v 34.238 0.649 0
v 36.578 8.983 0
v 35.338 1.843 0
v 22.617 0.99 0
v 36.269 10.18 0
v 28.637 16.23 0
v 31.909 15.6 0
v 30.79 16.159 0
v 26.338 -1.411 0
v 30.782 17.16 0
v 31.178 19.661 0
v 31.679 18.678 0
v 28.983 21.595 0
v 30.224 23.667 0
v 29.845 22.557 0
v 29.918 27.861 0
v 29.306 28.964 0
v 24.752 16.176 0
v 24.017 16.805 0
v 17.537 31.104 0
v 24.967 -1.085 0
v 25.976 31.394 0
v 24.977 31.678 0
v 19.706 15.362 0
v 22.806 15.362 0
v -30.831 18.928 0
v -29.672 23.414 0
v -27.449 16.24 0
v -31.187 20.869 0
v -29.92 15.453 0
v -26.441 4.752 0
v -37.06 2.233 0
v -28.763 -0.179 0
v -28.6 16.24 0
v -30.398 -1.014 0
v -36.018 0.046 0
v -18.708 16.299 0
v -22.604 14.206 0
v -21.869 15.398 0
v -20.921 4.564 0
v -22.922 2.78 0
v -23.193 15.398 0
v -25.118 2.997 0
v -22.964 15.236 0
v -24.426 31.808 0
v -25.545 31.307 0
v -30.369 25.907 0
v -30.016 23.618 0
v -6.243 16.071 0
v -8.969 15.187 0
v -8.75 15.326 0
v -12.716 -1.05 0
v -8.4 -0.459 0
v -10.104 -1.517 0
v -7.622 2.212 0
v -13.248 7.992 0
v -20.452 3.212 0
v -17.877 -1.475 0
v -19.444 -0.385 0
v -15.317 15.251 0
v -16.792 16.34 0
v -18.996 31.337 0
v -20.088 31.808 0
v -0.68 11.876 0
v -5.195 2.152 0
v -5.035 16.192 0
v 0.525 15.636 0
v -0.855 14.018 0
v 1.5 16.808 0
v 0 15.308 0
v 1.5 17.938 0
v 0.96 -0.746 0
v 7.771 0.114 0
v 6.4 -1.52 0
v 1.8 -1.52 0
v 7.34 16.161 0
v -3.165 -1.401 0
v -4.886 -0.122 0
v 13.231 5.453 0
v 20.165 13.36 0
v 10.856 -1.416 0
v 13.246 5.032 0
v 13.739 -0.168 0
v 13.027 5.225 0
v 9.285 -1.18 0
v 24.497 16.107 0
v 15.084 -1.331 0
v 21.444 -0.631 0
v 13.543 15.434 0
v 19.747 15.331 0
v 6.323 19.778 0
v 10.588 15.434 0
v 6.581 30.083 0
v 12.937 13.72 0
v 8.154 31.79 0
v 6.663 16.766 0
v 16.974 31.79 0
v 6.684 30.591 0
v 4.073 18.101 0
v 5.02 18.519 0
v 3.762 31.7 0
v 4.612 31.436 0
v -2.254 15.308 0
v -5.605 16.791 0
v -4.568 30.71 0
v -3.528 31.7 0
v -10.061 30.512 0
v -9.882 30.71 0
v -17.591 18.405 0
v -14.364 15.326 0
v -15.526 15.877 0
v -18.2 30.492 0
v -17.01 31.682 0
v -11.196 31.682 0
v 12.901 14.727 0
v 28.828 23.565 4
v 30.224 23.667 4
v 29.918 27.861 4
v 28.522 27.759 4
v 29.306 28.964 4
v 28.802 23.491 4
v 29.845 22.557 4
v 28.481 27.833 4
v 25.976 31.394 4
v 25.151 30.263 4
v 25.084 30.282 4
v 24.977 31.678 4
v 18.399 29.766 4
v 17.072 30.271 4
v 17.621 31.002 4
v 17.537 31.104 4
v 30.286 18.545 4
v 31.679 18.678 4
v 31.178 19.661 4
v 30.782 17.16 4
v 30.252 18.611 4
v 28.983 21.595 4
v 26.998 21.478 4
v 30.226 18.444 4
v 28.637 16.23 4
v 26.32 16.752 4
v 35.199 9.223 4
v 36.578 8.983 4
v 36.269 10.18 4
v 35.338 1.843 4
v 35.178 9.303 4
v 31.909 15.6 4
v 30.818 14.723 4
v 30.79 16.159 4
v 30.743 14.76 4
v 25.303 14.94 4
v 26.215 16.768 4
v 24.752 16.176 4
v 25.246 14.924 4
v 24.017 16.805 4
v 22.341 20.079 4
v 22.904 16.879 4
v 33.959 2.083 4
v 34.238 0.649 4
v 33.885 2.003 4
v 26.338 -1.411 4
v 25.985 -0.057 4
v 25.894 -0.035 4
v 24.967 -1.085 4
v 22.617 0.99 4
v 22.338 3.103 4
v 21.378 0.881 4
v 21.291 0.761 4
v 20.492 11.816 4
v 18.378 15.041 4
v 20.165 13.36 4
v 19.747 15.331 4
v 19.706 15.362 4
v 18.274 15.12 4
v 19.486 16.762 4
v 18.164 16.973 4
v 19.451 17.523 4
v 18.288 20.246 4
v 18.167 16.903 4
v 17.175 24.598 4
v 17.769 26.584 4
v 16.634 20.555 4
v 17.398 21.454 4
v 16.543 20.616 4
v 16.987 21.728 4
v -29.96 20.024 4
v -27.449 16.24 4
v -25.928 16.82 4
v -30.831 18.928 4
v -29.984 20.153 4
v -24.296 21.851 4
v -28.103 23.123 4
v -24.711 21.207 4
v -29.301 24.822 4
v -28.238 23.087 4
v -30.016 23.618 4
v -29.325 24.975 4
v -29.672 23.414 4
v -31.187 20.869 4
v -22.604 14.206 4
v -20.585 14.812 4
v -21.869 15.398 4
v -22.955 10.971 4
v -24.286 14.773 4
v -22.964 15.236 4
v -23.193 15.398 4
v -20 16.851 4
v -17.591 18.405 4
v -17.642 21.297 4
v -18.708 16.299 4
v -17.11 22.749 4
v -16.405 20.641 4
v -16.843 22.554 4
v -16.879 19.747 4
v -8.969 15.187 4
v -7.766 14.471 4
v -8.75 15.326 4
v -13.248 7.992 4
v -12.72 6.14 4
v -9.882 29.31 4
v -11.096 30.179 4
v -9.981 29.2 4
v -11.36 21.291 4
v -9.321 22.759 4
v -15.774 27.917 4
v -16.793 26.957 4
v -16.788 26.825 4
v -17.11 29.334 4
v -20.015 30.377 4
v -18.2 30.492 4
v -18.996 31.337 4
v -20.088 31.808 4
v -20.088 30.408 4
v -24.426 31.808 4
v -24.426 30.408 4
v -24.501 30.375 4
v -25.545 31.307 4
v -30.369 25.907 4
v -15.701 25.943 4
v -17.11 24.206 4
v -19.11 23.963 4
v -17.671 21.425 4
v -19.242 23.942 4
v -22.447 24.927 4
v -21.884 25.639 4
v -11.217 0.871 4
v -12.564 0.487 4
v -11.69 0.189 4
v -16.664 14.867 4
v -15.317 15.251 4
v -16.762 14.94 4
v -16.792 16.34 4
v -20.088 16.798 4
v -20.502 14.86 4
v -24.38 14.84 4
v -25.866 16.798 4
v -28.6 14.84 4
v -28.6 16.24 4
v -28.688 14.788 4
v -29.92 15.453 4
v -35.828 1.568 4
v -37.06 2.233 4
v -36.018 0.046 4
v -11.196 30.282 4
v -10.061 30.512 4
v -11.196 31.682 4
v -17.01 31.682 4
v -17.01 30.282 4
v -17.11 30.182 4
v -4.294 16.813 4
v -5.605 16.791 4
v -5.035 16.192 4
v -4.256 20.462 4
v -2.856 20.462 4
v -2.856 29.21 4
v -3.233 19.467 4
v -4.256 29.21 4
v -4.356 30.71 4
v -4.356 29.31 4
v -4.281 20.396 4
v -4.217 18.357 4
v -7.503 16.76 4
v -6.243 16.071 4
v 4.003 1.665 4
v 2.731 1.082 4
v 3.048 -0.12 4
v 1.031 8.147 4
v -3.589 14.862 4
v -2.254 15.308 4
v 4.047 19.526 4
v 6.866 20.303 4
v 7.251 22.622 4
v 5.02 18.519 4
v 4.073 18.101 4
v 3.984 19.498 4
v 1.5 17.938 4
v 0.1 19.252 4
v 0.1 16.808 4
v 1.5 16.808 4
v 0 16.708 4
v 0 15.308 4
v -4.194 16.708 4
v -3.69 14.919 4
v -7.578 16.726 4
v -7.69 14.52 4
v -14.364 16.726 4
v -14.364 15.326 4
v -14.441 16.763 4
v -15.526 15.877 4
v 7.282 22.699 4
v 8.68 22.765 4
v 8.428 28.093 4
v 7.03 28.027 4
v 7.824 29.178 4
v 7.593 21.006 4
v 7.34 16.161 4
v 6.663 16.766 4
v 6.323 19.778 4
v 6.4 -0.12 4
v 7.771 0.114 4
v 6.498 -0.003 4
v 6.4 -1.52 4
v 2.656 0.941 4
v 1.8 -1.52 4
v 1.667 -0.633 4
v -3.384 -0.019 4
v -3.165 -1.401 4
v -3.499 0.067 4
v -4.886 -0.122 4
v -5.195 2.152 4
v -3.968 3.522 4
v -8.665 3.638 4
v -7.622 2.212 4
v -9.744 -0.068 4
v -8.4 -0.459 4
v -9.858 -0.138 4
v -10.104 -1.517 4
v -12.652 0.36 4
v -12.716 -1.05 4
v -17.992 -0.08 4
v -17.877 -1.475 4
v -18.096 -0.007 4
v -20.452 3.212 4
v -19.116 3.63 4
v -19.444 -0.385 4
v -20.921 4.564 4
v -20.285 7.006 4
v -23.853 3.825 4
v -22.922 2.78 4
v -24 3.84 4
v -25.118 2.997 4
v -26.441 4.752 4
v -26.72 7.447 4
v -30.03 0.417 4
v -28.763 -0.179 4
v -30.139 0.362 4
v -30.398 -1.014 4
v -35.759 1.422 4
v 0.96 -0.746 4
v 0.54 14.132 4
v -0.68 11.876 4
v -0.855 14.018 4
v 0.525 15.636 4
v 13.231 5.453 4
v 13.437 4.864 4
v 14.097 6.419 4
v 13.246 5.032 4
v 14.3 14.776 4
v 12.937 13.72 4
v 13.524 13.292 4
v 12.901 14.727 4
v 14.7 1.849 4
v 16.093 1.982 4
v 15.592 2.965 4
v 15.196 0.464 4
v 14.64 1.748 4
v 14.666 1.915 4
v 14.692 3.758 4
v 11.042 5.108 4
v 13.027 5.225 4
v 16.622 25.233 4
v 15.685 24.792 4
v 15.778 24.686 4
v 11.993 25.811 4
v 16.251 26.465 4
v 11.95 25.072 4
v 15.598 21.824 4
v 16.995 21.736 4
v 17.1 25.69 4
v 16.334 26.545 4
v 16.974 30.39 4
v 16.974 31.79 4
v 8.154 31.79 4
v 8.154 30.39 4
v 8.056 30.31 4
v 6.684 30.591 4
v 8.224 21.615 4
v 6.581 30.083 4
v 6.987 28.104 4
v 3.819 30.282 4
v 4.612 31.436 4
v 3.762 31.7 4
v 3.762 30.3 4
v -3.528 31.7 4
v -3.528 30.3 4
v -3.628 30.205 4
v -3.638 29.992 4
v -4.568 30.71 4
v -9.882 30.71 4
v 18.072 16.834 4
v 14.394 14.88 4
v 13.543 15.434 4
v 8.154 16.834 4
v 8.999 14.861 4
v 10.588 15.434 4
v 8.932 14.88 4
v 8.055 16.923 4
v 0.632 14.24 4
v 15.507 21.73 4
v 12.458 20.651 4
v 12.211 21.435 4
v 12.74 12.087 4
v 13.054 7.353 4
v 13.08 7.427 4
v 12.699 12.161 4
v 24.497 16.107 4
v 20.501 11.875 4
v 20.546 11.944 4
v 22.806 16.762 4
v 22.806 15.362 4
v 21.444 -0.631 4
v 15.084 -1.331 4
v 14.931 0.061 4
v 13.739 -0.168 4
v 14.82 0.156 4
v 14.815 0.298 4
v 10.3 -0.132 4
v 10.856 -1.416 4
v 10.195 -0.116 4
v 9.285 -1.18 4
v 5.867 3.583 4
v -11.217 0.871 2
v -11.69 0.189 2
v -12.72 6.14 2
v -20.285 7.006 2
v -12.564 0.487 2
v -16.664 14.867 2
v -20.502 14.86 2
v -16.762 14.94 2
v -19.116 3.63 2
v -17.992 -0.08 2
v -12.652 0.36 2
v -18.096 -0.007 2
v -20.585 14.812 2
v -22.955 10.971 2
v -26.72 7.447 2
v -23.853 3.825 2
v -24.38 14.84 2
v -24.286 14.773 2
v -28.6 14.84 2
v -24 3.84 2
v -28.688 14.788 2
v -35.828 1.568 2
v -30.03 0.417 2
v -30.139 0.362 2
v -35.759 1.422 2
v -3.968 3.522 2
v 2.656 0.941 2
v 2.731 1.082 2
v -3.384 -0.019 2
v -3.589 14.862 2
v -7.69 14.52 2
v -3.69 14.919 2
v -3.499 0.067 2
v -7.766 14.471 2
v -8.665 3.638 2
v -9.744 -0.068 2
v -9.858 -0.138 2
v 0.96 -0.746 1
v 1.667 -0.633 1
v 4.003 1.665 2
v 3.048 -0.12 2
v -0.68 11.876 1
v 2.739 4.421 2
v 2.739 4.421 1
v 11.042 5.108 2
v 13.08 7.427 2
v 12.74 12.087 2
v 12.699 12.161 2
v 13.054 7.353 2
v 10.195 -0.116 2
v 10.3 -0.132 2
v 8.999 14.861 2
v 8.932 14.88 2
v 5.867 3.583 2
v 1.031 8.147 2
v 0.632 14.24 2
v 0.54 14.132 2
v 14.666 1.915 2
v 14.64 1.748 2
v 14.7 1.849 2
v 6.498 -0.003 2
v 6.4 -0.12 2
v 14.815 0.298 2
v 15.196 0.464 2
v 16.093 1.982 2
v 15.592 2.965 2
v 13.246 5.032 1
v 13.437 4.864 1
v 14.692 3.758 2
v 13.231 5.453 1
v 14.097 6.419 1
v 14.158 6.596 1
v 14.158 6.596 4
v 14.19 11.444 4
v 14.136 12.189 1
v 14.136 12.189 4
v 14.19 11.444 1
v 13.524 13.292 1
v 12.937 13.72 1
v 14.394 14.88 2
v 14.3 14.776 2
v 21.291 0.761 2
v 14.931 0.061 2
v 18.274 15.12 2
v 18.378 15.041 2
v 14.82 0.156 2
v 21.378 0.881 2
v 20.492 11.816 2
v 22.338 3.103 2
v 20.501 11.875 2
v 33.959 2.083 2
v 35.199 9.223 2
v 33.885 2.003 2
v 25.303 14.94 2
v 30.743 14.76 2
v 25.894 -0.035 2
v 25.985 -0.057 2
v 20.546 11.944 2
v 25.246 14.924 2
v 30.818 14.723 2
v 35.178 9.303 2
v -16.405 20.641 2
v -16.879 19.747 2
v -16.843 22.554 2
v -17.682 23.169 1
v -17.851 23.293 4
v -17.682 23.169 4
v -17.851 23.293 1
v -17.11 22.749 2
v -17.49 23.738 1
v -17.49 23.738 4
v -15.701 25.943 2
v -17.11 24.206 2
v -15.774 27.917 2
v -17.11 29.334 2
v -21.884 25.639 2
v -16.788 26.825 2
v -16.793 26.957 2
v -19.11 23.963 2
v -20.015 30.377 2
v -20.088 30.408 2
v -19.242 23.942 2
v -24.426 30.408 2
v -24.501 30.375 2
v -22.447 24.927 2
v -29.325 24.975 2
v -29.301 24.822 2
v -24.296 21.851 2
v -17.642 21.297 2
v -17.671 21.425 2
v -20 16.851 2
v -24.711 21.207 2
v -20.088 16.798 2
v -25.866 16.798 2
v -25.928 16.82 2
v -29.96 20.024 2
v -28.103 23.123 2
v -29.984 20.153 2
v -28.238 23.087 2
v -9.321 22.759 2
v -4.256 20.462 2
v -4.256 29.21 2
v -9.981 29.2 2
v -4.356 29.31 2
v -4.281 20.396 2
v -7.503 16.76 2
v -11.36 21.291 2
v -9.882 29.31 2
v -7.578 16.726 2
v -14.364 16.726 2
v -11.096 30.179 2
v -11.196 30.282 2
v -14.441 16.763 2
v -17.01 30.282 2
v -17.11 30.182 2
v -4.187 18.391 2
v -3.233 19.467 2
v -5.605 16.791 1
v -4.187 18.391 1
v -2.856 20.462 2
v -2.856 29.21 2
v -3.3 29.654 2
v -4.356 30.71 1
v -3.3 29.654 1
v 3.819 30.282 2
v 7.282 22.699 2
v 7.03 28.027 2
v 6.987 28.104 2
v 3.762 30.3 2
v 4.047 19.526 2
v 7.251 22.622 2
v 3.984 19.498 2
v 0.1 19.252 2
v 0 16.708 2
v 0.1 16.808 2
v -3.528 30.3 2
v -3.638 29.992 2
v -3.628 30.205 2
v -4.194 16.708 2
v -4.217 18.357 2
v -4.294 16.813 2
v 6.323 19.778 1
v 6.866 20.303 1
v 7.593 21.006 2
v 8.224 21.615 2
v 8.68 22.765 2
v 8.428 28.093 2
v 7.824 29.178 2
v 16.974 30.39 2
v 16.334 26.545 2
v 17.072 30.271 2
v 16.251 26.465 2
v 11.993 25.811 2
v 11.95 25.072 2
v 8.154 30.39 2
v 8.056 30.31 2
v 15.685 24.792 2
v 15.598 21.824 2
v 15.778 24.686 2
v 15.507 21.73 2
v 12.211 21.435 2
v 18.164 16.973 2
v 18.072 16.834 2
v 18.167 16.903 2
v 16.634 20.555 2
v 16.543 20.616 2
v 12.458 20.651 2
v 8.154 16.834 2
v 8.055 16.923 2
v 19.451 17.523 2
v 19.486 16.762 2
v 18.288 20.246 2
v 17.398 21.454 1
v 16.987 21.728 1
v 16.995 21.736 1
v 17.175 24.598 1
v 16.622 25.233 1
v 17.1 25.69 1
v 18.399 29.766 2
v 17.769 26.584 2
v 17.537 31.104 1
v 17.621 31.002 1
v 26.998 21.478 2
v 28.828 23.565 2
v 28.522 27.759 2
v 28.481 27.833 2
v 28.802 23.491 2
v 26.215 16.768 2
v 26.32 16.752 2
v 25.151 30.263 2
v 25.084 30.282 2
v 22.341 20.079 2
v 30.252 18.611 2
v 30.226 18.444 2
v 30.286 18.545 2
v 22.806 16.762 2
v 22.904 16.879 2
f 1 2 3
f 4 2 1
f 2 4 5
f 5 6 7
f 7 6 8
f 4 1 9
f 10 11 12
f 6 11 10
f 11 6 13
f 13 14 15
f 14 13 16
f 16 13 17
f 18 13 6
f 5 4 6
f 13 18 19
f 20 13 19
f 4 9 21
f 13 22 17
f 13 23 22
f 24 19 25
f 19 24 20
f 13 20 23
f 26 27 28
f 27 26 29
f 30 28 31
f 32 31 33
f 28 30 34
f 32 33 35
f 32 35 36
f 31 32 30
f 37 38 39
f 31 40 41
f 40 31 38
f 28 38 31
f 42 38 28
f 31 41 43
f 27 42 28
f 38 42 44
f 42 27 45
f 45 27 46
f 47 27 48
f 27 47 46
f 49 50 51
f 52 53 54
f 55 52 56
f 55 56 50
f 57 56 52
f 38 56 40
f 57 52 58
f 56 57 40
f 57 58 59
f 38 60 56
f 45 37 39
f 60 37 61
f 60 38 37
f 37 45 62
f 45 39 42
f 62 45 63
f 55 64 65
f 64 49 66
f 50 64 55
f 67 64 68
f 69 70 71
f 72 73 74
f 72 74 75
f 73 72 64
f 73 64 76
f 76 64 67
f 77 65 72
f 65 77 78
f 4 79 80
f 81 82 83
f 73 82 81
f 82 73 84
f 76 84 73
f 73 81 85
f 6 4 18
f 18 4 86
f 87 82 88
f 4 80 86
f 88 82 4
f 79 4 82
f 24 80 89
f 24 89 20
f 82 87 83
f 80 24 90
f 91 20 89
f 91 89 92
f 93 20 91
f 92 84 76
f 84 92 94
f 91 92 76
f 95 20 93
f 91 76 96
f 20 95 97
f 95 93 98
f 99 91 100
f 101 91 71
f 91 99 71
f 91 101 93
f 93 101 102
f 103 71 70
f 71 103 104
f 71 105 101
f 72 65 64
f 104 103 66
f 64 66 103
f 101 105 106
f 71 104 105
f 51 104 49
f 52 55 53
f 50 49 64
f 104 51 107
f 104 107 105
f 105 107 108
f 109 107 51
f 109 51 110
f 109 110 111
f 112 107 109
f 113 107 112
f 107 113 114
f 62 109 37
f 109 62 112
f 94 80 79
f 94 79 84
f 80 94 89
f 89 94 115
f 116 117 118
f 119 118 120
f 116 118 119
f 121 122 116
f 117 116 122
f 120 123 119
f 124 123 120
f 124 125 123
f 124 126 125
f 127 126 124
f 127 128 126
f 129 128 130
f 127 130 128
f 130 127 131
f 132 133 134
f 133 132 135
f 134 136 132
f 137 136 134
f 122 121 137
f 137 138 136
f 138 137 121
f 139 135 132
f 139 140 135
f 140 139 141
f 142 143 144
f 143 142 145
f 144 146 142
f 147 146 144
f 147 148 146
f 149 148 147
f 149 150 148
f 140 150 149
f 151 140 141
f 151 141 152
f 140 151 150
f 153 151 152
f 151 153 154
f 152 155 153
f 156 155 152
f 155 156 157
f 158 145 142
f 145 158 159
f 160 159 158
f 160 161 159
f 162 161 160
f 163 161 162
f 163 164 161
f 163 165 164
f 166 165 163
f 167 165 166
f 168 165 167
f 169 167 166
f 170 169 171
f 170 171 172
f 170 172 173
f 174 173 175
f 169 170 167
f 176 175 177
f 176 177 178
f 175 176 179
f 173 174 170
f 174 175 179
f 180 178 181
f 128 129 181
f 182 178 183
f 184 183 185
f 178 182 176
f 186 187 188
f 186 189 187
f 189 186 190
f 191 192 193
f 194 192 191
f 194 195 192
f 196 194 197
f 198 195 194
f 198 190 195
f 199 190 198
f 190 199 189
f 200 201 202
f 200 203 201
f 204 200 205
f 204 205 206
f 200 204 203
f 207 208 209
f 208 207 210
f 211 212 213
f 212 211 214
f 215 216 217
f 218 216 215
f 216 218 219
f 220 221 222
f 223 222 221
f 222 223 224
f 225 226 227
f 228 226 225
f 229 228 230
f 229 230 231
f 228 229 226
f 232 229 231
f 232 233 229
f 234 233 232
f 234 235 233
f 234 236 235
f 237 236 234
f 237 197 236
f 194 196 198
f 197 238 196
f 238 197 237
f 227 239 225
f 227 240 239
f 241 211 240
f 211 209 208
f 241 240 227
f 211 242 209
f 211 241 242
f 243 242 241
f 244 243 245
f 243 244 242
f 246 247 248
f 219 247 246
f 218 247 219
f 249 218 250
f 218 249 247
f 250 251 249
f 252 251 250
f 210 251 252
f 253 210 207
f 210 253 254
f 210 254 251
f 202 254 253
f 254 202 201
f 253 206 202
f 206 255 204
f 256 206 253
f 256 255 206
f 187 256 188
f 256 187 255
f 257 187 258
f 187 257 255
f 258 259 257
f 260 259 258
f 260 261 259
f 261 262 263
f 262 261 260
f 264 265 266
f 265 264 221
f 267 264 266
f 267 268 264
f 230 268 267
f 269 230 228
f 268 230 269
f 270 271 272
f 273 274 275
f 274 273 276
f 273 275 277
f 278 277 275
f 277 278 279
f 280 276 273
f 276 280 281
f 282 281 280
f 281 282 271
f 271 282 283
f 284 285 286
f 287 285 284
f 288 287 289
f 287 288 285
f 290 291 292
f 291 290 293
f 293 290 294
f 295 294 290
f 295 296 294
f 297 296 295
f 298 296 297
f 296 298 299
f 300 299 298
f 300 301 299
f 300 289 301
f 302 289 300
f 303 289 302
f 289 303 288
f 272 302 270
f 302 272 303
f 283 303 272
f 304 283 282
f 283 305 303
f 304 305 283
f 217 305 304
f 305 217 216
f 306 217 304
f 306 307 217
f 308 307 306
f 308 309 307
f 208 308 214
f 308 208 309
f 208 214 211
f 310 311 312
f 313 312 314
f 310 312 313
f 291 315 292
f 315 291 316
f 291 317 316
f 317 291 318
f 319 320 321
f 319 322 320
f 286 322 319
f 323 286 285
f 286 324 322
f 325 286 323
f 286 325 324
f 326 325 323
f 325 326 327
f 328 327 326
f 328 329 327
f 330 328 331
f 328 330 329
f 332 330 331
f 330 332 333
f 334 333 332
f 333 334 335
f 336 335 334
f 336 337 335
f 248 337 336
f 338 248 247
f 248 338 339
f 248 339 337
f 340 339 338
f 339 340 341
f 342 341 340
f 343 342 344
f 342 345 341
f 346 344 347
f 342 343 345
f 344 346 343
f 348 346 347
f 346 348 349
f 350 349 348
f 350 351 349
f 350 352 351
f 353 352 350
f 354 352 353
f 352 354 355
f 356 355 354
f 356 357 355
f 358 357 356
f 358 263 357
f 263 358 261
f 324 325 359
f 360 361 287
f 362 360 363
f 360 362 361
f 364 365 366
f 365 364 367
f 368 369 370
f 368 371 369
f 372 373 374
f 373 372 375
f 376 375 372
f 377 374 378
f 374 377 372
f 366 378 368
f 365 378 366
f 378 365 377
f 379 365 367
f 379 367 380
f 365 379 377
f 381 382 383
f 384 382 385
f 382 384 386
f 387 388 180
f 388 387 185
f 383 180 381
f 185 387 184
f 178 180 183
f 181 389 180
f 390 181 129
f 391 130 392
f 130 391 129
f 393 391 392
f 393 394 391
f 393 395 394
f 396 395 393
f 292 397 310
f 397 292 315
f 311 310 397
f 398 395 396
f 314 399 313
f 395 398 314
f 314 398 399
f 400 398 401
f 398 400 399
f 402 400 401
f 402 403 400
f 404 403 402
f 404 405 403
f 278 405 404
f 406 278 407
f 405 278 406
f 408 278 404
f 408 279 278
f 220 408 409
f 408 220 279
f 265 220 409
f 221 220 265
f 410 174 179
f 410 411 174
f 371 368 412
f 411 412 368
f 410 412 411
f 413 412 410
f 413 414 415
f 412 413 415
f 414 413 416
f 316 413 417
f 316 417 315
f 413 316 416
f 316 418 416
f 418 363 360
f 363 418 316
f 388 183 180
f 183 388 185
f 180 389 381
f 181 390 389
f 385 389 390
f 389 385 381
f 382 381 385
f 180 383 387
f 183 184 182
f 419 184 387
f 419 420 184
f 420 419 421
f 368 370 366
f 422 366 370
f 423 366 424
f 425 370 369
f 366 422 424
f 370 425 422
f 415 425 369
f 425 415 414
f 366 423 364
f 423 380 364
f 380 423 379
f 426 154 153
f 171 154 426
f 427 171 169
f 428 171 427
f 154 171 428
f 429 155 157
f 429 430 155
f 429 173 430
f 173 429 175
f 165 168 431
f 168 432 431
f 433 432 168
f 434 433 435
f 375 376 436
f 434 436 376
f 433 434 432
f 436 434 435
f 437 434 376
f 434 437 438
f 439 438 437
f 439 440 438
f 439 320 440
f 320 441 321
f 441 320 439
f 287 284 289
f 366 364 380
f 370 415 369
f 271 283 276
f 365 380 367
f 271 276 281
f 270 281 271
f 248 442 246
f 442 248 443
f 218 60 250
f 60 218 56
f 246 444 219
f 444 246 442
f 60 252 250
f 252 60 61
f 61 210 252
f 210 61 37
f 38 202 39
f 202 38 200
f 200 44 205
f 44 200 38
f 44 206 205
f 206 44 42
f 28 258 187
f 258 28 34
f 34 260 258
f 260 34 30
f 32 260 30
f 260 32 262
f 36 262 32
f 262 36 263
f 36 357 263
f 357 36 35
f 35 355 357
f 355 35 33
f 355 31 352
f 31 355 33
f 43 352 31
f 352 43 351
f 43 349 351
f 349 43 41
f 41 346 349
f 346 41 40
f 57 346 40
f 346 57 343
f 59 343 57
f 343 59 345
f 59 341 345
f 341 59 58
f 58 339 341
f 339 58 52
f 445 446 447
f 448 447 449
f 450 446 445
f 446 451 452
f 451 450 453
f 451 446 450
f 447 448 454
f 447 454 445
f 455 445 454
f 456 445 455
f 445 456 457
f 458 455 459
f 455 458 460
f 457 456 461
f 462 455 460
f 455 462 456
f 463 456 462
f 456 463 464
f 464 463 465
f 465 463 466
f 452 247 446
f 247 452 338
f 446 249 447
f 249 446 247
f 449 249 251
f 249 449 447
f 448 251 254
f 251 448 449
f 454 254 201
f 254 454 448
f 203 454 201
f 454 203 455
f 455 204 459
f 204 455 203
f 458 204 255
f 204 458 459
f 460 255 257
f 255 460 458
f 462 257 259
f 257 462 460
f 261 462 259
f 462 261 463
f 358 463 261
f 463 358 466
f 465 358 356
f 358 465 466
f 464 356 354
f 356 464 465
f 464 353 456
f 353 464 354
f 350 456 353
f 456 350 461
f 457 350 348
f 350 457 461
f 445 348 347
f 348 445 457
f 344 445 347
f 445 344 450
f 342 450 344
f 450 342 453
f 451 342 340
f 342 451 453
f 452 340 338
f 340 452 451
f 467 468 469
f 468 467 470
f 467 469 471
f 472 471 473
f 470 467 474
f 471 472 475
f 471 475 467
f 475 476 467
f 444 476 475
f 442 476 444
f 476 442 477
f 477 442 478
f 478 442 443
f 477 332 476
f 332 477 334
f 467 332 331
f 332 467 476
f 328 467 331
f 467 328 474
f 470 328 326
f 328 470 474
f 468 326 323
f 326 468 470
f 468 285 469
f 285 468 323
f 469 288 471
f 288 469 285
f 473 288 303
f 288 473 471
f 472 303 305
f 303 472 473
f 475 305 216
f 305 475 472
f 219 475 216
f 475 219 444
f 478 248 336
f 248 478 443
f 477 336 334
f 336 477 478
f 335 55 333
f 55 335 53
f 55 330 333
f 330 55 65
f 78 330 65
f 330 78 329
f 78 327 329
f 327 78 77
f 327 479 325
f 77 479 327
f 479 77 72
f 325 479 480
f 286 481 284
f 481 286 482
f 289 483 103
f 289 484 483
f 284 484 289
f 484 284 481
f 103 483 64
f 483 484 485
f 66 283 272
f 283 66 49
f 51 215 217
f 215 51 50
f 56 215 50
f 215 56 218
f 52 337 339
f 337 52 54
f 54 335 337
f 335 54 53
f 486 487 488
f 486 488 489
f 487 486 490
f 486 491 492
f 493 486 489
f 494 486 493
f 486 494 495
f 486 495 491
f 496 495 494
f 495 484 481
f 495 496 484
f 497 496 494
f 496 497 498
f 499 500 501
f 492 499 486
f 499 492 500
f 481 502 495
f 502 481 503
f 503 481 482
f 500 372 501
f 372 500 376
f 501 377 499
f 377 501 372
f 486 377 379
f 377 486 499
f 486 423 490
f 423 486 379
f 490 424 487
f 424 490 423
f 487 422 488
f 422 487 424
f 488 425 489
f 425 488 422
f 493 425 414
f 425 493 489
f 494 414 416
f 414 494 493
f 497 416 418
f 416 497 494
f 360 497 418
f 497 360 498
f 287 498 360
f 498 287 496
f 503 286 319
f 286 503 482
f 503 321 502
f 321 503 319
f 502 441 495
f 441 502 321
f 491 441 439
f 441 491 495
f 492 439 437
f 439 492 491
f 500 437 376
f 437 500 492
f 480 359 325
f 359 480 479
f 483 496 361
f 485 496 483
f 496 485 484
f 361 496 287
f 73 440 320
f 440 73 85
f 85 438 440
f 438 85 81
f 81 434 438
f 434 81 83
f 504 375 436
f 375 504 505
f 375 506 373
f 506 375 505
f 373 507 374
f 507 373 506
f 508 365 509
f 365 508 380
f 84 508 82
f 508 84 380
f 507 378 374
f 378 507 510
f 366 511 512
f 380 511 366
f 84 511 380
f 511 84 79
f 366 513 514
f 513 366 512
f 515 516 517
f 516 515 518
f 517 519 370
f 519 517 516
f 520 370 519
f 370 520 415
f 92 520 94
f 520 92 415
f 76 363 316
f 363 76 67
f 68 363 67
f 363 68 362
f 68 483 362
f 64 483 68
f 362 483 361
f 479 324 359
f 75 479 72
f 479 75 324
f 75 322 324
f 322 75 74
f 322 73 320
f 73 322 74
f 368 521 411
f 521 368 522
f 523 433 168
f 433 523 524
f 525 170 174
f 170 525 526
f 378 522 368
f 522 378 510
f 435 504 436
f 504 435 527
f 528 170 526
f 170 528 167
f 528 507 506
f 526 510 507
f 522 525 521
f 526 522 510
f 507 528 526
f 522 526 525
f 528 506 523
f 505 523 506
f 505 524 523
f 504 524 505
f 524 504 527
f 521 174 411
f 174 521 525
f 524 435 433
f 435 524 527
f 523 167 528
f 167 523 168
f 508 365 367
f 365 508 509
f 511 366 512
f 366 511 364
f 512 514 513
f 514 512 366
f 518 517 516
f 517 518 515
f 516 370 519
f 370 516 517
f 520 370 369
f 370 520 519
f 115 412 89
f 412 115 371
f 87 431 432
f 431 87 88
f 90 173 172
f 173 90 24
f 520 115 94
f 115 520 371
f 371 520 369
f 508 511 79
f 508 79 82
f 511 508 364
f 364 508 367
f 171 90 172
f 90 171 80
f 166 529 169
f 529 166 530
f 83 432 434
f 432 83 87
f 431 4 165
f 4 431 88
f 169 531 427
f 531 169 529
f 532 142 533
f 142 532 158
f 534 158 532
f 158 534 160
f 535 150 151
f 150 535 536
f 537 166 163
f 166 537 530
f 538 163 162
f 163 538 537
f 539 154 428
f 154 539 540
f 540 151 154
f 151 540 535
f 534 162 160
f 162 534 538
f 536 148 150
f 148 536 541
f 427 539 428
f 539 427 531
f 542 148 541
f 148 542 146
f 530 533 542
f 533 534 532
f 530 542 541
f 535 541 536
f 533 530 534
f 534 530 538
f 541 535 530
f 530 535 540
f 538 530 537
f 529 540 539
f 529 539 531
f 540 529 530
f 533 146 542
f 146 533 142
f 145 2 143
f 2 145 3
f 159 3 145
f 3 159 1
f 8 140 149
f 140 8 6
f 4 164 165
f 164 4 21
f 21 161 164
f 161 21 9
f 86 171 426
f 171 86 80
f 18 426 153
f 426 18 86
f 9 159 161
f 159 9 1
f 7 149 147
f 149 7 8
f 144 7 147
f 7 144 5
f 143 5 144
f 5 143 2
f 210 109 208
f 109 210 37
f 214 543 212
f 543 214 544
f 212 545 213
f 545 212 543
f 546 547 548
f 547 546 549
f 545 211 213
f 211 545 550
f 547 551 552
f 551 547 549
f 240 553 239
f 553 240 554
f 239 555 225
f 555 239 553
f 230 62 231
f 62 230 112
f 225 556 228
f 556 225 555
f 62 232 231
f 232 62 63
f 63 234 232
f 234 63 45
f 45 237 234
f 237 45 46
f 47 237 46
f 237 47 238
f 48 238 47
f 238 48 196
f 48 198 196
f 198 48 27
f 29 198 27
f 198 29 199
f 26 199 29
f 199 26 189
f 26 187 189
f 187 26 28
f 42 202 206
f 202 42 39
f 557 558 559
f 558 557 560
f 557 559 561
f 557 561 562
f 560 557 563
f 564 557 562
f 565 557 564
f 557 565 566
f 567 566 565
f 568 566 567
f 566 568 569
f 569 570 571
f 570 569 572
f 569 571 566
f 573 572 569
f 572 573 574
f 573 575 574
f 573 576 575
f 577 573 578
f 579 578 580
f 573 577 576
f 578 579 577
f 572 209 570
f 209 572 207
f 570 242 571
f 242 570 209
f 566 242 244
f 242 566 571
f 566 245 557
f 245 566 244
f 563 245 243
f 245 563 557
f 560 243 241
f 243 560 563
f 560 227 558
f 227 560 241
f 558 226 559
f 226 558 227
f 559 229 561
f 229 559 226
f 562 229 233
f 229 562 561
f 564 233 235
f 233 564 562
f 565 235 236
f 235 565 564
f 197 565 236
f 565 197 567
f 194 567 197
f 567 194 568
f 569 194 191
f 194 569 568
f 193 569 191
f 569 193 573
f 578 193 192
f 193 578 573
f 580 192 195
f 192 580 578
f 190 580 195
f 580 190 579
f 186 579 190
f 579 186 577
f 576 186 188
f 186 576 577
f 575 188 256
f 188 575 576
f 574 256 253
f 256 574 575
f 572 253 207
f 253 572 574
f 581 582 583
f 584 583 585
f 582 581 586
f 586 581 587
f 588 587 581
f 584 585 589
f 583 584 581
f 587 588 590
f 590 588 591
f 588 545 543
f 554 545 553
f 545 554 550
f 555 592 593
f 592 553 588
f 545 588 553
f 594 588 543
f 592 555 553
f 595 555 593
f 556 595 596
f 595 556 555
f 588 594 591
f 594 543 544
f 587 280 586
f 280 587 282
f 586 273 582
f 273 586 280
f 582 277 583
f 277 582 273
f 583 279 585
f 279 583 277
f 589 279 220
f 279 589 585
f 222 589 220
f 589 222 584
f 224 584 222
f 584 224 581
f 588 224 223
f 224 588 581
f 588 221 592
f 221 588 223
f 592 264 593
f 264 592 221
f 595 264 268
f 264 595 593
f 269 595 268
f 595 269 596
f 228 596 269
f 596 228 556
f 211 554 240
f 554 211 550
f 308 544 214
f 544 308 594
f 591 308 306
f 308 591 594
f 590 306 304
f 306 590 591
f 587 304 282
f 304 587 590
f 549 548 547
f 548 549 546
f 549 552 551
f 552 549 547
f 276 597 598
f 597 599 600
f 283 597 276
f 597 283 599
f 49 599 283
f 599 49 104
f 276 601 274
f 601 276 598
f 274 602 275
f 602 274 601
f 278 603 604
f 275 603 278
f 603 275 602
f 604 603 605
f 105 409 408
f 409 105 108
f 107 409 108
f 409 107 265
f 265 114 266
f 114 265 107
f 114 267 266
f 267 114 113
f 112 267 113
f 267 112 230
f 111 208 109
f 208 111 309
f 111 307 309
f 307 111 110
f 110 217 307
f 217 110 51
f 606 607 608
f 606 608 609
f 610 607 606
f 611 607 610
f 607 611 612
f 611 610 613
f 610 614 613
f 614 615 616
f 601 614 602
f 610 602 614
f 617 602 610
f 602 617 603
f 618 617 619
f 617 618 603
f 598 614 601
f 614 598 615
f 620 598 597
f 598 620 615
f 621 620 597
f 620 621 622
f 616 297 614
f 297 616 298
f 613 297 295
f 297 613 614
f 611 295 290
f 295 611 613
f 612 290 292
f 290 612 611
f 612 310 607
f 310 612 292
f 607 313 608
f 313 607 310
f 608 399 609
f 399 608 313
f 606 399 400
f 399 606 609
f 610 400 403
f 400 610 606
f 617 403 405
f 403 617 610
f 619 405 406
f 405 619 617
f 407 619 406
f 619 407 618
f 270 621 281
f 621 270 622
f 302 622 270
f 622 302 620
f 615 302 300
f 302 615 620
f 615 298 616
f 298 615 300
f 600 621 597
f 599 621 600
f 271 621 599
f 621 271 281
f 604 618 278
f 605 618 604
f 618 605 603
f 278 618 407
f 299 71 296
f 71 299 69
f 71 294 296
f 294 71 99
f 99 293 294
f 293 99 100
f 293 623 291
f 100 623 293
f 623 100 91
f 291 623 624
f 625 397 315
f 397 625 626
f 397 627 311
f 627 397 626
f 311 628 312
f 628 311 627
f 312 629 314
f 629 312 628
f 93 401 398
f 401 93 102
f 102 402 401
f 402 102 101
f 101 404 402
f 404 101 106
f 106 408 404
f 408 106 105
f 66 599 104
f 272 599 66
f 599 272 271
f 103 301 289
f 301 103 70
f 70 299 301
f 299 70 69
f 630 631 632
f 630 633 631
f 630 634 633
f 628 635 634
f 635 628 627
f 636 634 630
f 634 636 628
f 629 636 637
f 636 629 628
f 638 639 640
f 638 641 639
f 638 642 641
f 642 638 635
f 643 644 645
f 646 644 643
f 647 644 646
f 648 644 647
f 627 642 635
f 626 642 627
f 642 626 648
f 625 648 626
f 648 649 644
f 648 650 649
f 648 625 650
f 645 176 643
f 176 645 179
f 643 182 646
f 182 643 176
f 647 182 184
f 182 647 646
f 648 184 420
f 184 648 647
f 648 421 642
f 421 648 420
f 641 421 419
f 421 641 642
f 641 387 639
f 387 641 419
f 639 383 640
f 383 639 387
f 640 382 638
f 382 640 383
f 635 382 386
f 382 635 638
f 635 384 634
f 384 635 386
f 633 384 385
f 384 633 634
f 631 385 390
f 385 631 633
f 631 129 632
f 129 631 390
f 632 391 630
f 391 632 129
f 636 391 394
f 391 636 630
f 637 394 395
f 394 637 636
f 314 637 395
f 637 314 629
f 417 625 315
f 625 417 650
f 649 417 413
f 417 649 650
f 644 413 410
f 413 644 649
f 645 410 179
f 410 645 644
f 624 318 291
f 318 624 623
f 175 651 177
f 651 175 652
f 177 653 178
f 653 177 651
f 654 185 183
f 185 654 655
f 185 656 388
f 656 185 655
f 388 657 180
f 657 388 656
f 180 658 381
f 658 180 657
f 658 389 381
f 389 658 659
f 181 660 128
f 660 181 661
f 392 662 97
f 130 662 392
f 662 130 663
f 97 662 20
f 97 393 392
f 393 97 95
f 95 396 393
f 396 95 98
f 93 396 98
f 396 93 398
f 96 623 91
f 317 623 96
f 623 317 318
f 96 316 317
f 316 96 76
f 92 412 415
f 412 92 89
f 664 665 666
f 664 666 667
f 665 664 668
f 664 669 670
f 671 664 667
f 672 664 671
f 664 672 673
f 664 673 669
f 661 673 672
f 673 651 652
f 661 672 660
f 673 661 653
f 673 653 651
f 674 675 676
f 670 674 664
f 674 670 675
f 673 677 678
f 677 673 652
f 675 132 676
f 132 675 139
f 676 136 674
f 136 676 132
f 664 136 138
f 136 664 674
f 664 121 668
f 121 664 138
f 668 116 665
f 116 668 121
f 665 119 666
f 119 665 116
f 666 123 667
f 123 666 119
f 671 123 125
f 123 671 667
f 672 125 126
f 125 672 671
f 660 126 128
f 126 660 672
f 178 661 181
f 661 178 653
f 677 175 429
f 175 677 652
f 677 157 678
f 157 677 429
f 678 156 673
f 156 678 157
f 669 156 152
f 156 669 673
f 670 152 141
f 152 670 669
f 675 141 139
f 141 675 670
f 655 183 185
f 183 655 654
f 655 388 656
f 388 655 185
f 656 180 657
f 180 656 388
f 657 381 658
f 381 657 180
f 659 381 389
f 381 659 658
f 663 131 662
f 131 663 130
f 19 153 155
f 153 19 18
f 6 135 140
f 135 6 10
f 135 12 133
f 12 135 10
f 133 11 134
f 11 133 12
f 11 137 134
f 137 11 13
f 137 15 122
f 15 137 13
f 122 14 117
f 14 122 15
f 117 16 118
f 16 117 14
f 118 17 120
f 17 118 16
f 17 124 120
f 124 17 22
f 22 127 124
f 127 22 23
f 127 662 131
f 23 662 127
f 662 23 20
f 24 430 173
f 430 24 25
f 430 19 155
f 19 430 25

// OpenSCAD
// Choose your custom words and write them in UPPERCASE.
// If you want only one line, you can leave the second word empty.
word1 = "SUPER";
word2 = "MARIO";

// The following values are model constants and are not intended to be changed by the end user.
//-----------------
// [Fixed design parameters]

// Scale factor for the first word (word1)
scale_word1 = 1.8;

// Scale factor for the second word (word2)
scale_word2 = 2.0;

// Height of the extruded letters
scale_height = 5.0;

// Height of the brim (the base outline under the letters)
brim_height = 4.0;

// Radius/offset for the brim outline
brim_radius = 1.5;

// Vertical gap between the two words
gap = 2;

// Horizontal spacing between letters
spacing = 0.0;

// Thickness of the base of the brim
bottom_thickness = 2;

// Small tolerance to help letters fit into the brim
wiggle = 0.1;




//-----------------

// Path data for each letter and symbol, used to draw the glyphs
// Each glyph is a list of 2D points (x, y), divided by 100 for scaling
glyph_A = [
    [449, 741], [765, 52], [463, 4], [439, 181], [196, 187], [141, -2], [-150, 50], [249, 721], [449, 741]
]/100;
glyph_B = [
    [138, 747], [485, 706], [565, 578], [559, 441], [507, 363], [580, 321], [629, 178], [573, 45], [457, 4], [21, 1], [1, 704], [138, 747]
]/100;
glyph_C = [
    [287, 744], [563, 726], [552, 461], [372, 545], [215, 472], [208, 302], [346, 208], [549, 314], [617, 35], [218, 0], [23, 171], [-35, 386], [55, 617], [287, 744]
]/100;
glyph_D = [
    [368, 744], [578, 572], [621, 171], [414, 2], [0, 2], [0, 699], [368, 744]
]/100;
glyph_E = [
    [54, 745], [544, 745], [503, 538], [262, 501], [259, 450], [472, 434], 
    [462, 275], [272, 258], [289, 204], [520, 202], [605, 3], [54, 3], 
    [0, 481], [54, 745]
]/100;
glyph_F = [
    [49, 746], [553, 742], [525, 501], [250, 532], [246, 452], [479, 464], [441, 244], [246, 269], [288, 3], [22, 3], [1, 543], [49, 746]
]/100;
glyph_G = [
    [627, 591], [456, 495], [387, 533], [285, 502], [224, 357], [288, 222], [472, 244], [476, 277], [334, 264], [352, 465], [648, 461], [648, 66], [151, 2], [0, 309], [55, 591], [267, 745], [527, 727], [627, 591]
]/100;
glyph_H = [
    [0, 698], [252, 746], [264, 441], [411, 463], [420, 732], [626, 723], [666, 5], [434, 13], [432, 238], [292, 211], [297, 5], [80, 5],
    [0, 698]
]/100;
glyph_I = [
    [5, 739], [199, 751], [349, 43], [31, 8], [5, 739]
]/100;
glyph_J = [
    [0, 739], [219, 744], [658, 724], [658, 528], [459, 509],
    [533, 162], [430, 32], [235, 0], [18, 0], [25, 220],
    [263, 237], [236, 509], [0, 528], [0, 739]
]/100;
glyph_K = [
    [14, 741], [223, 741], [218, 539], [375, 718], [518, 566],
    [337, 369], [605, 178], [440, 0], [216, 243], [257, -2],
    [0, -2], [14, 741]
]/100;
glyph_L = [
    [278, 717], [249, 269], [556, 306], [584, 75], [28, 9],
    [0, 749], [278, 717]
]/100;
glyph_M = [
    [0, 76], [357, 737], [568, 737], [638, 537], [762, 738],
    [949, 742], [1154, 23], [887, 1], [836, 183], [775, 359],
    [591, 195], [450, 382], [281, 23], [0, 76]
]/100;
glyph_N = [
    [0, 13], [133, 742], [284, 742], [425, 510], [437, 742],
    [669, 706], [620, 4], [428, 16], [280, 242], [237, 3],
    [0, 13]
]/100;
glyph_O = [
    [522, 733], [740, 462], [678, 105], [283, 2], [-32, 280],
    [15, 593], [250, 742], [522, 733]
]/100;
glyph_P = [
    [442, 740], [618, 619], [632, 323], [454, 151], [233, 137], [233, -4], [0, -4], [37, 740], [442, 740]
]/100;
glyph_Q =[
    [531, 731], [721, 478], [653, 216], [797, 84], [621, -2], [535, 61], [238, -3], [-21, 243], [26, 593], [260, 740], [531, 731]
]/100;
glyph_R = [
    [415, 739], [600, 604], [617, 371], [513, 255], [698, 92], [481, -2], [254, 192], [288, -1], [58, -1], [0, 707], [415, 739]
]/100;
glyph_S = [
    [725, 556], [596, 397], [445, 494], [407, 446], [677, 248], [546, 1], [225, 1], [1, 179], [98, 342], [291, 233],
    [320, 278], [37, 446], [305, 746], [546, 746], [725, 556]
]/100;
glyph_T = [
    [0, 742], [739, 729], [739, 429], [489, 470], [558, -1], [200, -1], [254, 470], [0, 483], [0, 742]
]/100;
glyph_U = [
    [-9, 739], [314, 739], [299, 234], [424, 324], [387, 685], [694, 685], [694, 199], [515, -3], [138, -3], [-9, 177], [-9, 739]
]/100;
glyph_V = [
    [0, 745], [259, 731], [362, 284], [401, 334], [512, 731], [799, 745], [517, 3], [169, 29], [0, 745]
]/100;
glyph_W = [
    [1028, 675], [709, 6], [523, 6], [454, 207], [352, 5], [182, 0], [0, 723], [238, 744], [283, 562], [337, 385], [502, 550], [627, 362], [778, 729], [1028, 675]
]/100;
glyph_X = [
    [200, 739], [357, 579], [473, 750], [663, 568], [525, 405], [753, 226], [563, 7], [399, 221], [191, 12], [0, 201], [221, 400], [53, 588], [200, 739]
]/100;
glyph_Y = [
    [71, 733], [236, 557], [391, 753], [610, 588], [371, 380], [548, 13], [156, 31], [156, 350], [-93, 588], [71, 733]
]/100;
glyph_Z = [
    [617, 3], [0, 28], [0, 228], [248, 486], [0, 471], [44, 748], [625, 707], [614, 517], [386, 265], [625, 300], [617, 3]
]/100;
glyph_0 = [
    [381, 732], [552, 531], [497, 90], [224, 1], [3, 223], [48, 606], [202, 742], [381, 732], [560, 732]
]/100;
glyph_1 = [
    [527, 727], [468, 205], [679, 232], [713, 1], [0, 1], [20, 218], [258, 205], [258, 476], [133, 397], [0, 578], [269, 741], [527, 741]
]/100;
glyph_2 = [
    [4, 605], [211, 742], [392, 741], [544, 629], [610, 352], [411, 221], [629, 239], [686, 1], [110, 9], [34, 156], [330, 390], [309, 454], [261, 492], [140, 409], [4, 605]
]/100;
glyph_3 = [
    [1, 607], [178, 740], [403, 708], [511, 522], [441, 421], [528, 357], [534, 131], [415, 1], [148, 26], [1, 175], [120, 291], [220, 197], [314, 222], [317, 279], [170, 329], [176, 419], [295, 498], [264, 531], [97, 454], [1, 607]
]/100;
glyph_4 = [
    [531, 409], [689, 402], [689, 223], [548, 214], [575, 31], [318, 4], [314, 214], [8, 214], [4, 400], [208, 747], [487, 728], [531, 409]
]/100;
glyph_5 = [
    [572, 741], [530, 543], [247, 546], [253, 501], [415, 495], [610, 389], [609, 166], [534, 45], [189, 10], [7, 95], [88, 248], [212, 205], [324, 200], [368, 251], [318, 298], [91, 293], [10, 433], [0, 724], [572, 741]
]/100;
glyph_6 = [
    [154, 719], [335, 746], [515, 709], [447, 499], [286, 559], [211, 500], [202, 444], [416, 438], [501, 300], [499, 120], [380, 1], [136, 1], [0, 120], [0, 371], [28, 575], [154, 719]
]/100;
glyph_7 = [
    [0, 740], [641, 726], [524, -3], [234, 66], [393, 501], [51, 473], [0, 740]
]/100;
glyph_8 = [
    [461, 716], [533, 519], [446, 450], [562, 355], [577, 61], [414, -3], [154, -3], [0, 87], [17, 351], [139, 444], [46, 519], [116, 745], [461, 716]
]/100;
glyph_9 = [
    [306, 747], [533, 593], [524, 320], [447, 127], [116, 1], [0, 161], [264, 230], [319, 327], [137, 313], [0, 463], [36, 677], [306, 747]
]/100;
glyph_at = [
    [422, 103], [606, 184], [657, 125], [441, 2], [160, 63], [3, 349], [116, 715], [381, 854], [786, 684], [869, 344], [800, 248], [744, 167], [636, 182], [594, 233], [461, 169], [234, 206], [183, 482], [323, 672], [510, 664], [596, 607], [599, 637], [670, 600], [653, 418], [677, 260], [722, 243], [783, 364], [710, 615], [385, 748], [197, 637], [119, 371], [212, 165], [422, 103]
]/100;
glyph_b_l = [
    [233, 856], [241, 782], [89, 795], [84, -15], [241, 15], [241, -83], [7, -98], [2, 866], [233, 856]
]/100;
glyph_b_r = [
    [9, -88], [1, -14], [153, -27], [158, 783], [1, 753], [1, 851], [235, 866], [240, -98], [9, -88]
]/100;
glyph_per = [
    [389, 745], [572, 774], [206, 33], [0, 4], [389, 745], [475, 293], [544, 213], [522, 35], [412, 0], [324, 88], [342, 242], [404, 297], [475, 293], [389, 745], [191, 768], [260, 687], [238, 510], [128, 474], [38, 564], [57, 717], [119, 771], [191, 768], [389, 745]
]/100;
glyph_num = [
    [395, 778], [292, 29], [156, 0], [274, 749], [395, 778],
    
    [544, 749], [665, 778], [563, 29], [426, 0], [544, 749], 
    
   [718, 601], [810, 451], [113, 429], [4, 594], [718, 601],  
    
    [733, 328], [832, 169], [135, 147], [60, 316], [733, 328], [718, 601], [544, 749], [395, 778]
]/100;
glyph_dol = [
    [664, 550], [546, 405], [431, 528], [289, 576], [254, 531], [664, 256], [500, 42], [206, 42], [1, 205], [90, 354], [259, 208], [444, 163], [471, 204], [34, 450], [279, 724], [500, 724], 
    [424, 794], [341, 795], [283, -32], [399, -20], [424, 794], [500, 724]
]/100;
glyph_asc = [
    [278, 582], [164, 765], [68, 601], [8, 638], [164, 882], [348, 593], [278, 582]
]/100;
glyph_bar = [
    [60, -121], [5, -121], [3, 853], [58, 853], [60, 974], [115, 974], [60, -121]
]/100;
glyph_ast = [
    [67, 719], [97, 720], [93, 653], [144, 696], [158, 662], [99, 638], [161, 608], [141, 585], [93, 620], [99, 558], [49, 561], [55, 620], [22, 617], [28, 676], [78, 640], [28, 699], [95, 673], [95, 730], [45, 694], [23, 722], [90, 748], [38, 784], [67, 719]
]/100;
glyph_col = [
    [92, 179], [164, 144], [172, 49], [114, 8], [50, 20], [20, 52], [10, 136], [92, 179], [97, 320], [170, 386], [167, 456], [84, 503], [16, 463], [22, 362], [97, 320]
]/100;
//glyph_scol = [
    //[72, 456], [139, 496], [220, 450], [223, 381], [154, 317], [81, 358], [89, 95], [164, 91], [142, -17], [61, -92], [11, -92], [80, 5]
//]/100;
glyph_dot = [
    [107, 173], [186, 173], [233, 91], [200, 30], [107, 9], [64, 82], [107, 173]
]/100;
glyph_sl = [
    [375, 727], [551, 755], [198, 41], [0, 13], [375, 727]
]/100;
glyph_add = [
    [222, 524], [220, 424], [323, 434], [336, 320], [220, 325], [233, 221], [125, 213], [116, 325], [15, 328], [-2, 423], [119, 423], [108, 529], [222, 524]
]/100;
glyph_com = [
    [58, 81], [138, 76], [114, -39], [28, -119], [-25, -119], [48, -15], [58, 81]
]/100;
glyph_dif = [
    [6, 342], [1, 431], [325, 471], [341, 354], [6, 342]
]/100;
glyph_equ = [
    [5, 299], [0, 353], [305, 377], [320, 307], [5, 299], [5, 435], [0, 488], [305, 512], [320, 442], [5, 435]
]/100;
glyph_que = [
    [242, 144], [298, 68], [263, 3], [174, 0], [138, 54], [162, 140], [242, 144],
    [256, 465], [284, 573], [226, 609], [138, 528], [0, 671], [131, 779], [308, 779], [437, 623], [432, 424], [293, 330], [308, 190], [126, 190], [105, 345], [256, 465], [242, 144]
]/100;
glyph_exc = [
    [213, 219], [93, 210], [0, 768], [197, 796], [213, 219],[71, 78], [106, 144], [197, 148], [233, 92], [209, 4], [128, 1], [71, 78]
]/100;
glyph_les = [
    [37, 785], [91, 776], [91, 665], [38, 593], [-3, 609], [38, 691], [205, 776], [205, 665], [152, 593], [99, 609], [140, 691], [139, 785],
    [205, 776], [205, 665], [152, 593], [99, 609], [140, 691], [139, 785]
]/100;
glyph_pr = [
    [0, 785], [71, 785], [175, 658], [251, 402], [240, 130], [200, 2], [80, -100], [33, -80], [120, 41], [150, 268], [119, 498], [0, 785]
]/100;
glyph_pl = [
    [250, 780], [132, 622], [67, 392], [92, 166], [218, -62], [130, -62], [80, 40], [20, 194], [0, 465], [76, 721], [120, 800], [220, 860], [354, 890], [354, 800]
]/100;
glyph_uns = [
    [0, -28], [0, 27], [728, 27], [728, -28], [0, -28]
]/100;
glyph_qus = [
    [37, 785], [91, 776], [91, 665], [38, 593], [-3, 609], [38, 691], [37, 785]
]/100;

// Path data for the holes in the letters and symbols
hole_A = [
    [300, 479], [259, 377], [412, 373], [377, 476], [323, 479]
]/100;
hole_B = [
    [257, 152], [359, 174], [359, 242], [257, 277], [257, 152], [244, 462], [345, 483], [345, 565], [244, 587], [244, 462]
]/100;
hole_D = [
    [229, 477], [229, 259], [364, 306], [364, 415], [229, 477]
]/100;
hole_O = [
    [309, 481], [258, 367], [346, 308], [439, 342], [434, 453], [309, 481]
]/100;
hole_P = [
    [274, 512], [267, 391], [333, 382], [417, 481], [274, 512]
]/100;
hole_Q = [
    [228, 477], [221, 272], [385, 223], [294, 313], [426, 409], [505, 336], [532, 388], [432, 523], [228, 477]
]/100;
hole_R = [
    [254, 532], [248, 390], [309, 382], [370, 470], [254, 532]
]/100;
hole_0 = [
    [257, 488], [235, 324], [279, 287], [327, 321], [318, 462], [257, 462]

]/100;
hole_4 = [
    [216, 409], [305, 409], [297, 513], [216, 409]
]/100;
hole_6 = [
    [258, 267], [211, 244], [213, 185], [292, 185], [308, 249], [258, 267]
]/100;
hole_8 = [
    [364, 259], [306, 283], [248, 259], [248, 211], [306, 187], [364, 211], [364, 259], [332, 587], [288, 605], [244, 587], [244, 551], [288, 533], [332, 551], [332, 587]
]/100;
hole_9 = [
    [225, 480], [312, 480], [321, 527], [281, 560], [225, 527], [225, 480]
]/100;
hole_at = [
    [381, 514], [336, 445], [365, 351], [451, 351], [508, 418], [479, 504], [381, 514]
]/100;
hole_per = [
    [426, 195], [417, 129], [435, 114], [454, 128], [451, 185], [426, 195],
    [141, 670], [132, 604], [149, 589], [169, 603], [165, 659], [141, 670]
]/100;
// Width of the letters
width = [765-100/*A*/, 629-1/*B*/, 617+35/*C*/, 621-0/*D*/, 605-25/*E*/, 553-1/*F*/, 648-0/*G*/, 666-0/*H*/, 350-50/*I*/, 658-0/*J*/, 540-0/*K*/, 584-0/*L*/, 1154-0/*M*/, 669-0/*N*/, 740+32/*O*/, 632-0/*P*/, 797+21/*Q*/, 698-15/*R*/, 725+1/*S*/, 739-0/*T*/, 694+9/*U*/, 799-0/*V*/, 1028-0/*W*/, 753-0/*X*/, 610+93/*Y*/, 625-0/*Z*/, 560-3/*0*/, 620/*1*/, 686-4/*2*/, 600/*3*/, 689-4/*4*/, 680/*5*/, 515/*6*/, 641/*7*/, 577/*8*/, 533/*9*/, 869/*@*/, 240/*[*/, 240/*]*/, 572/*%*/, 572/*#*/, 664/*$*/, 348/*^*/, 115/*|*/, 161/***/, 172+79/*:*/, 220/*;*/, 270/*.*/, 551/*/*/, 336/*+*/, 160/*,*/, 330/*-*/, 310/*=*/, 430/*?*/, 230/*!*/, 882/*<*/, 251/*)*/, 354/*(*/, 728/*_*/, 90/*'*/]/100;
width_A = width[0];
width_B = width[1];
width_C = width[2];
width_D = width[3];
width_E = width[4];
width_F = width[5];
width_G = width[6];
width_H = width[7];
width_I = width[8];
width_J = width[9];
width_K = width[10];
width_L = width[11];
width_M = width[12];
width_N = width[13];
width_O = width[14];
width_P = width[15];
width_Q = width[16];
width_R = width[17];
width_S = width[18];
width_T = width[19];
width_U = width[20];
width_V = width[21];
width_W = width[22];
width_X = width[23];
width_Y = width[24];
width_Z = width[25];
width_0 = width[26];
width_1 = width[27];
width_2 = width[28];
width_3 = width[29];
width_4 = width[30];
width_5 = width[31];
width_6 = width[32];
width_7 = width[33];
width_8 = width[34];
width_9 = width[35];
width_at = width[36];
width_b_l = width[37];
width_b_r = width[38];
width_per = width[39];
width_num = width[40];
width_dol = width[41];
width_asc = width[42];
width_bar = width[43];
width_ast = width[44];
width_col = width[45];
width_scol = width[46];
width_dot = width[47];
width_sl = width[48];
width_add = width[49];
width_com = width[50];
width_dif = width[51];
width_equ = width[52];
width_que = width[53];
width_exc = width[54];
width_les = width[55];
width_pr = width[56];
width_pl = width[57];
width_uns = width[58];
width_qus = width[59];
// Function that returns the path data for any supported letter or symbol
function glyph_sorter_all(letter) =
    letter == "A" ? (glyph_A) :
    letter == "B" ? (glyph_B) :
    letter == "C" ? (glyph_C) :
    letter == "D" ? (glyph_D) :
    letter == "E" ? (glyph_E) :
    letter == "F" ? (glyph_F) :
    letter == "G" ? (glyph_G) :
    letter == "H" ? (glyph_H) :
    letter == "I" ? (glyph_I) :
    letter == "J" ? (glyph_J) :
    letter == "K" ? (glyph_K) :
    letter == "L" ? (glyph_L) :
    letter == "M" ? (glyph_M) :
    letter == "N" ? (glyph_N) :
    letter == "O" ? (glyph_O) :
    letter == "P" ? (glyph_P) :
    letter == "Q" ? (glyph_Q) :
    letter == "R" ? (glyph_R) :
    letter == "S" ? (glyph_S) :
    letter == "T" ? (glyph_T) :
    letter == "U" ? (glyph_U) :
    letter == "V" ? (glyph_V) :
    letter == "W" ? (glyph_W) :
    letter == "X" ? (glyph_X) :
    letter == "Y" ? (glyph_Y) :
    letter == "Z" ? (glyph_Z) :
    letter == "0" ? (glyph_0) :
    letter == "1" ? (glyph_1) :
    letter == "2" ? (glyph_2) :
    letter == "3" ? (glyph_3) :
    letter == "4" ? (glyph_4) :
    letter == "5" ? (glyph_5) :
    letter == "6" ? (glyph_6) :
    letter == "7" ? (glyph_7) :
    letter == "8" ? (glyph_8) :
    letter == "9" ? (glyph_9) :
    letter == "@" ? (glyph_at) :
    letter == "[" ? (glyph_b_l) :
    letter == "]" ? (glyph_b_r) :
    letter == "%" ? (glyph_per) :
    letter == "#" ? (glyph_num) :
    letter == "$" ? (glyph_dol) :
    letter == "^" ? (glyph_asc) :
    letter == "|" ? (glyph_bar) :
    letter == "*" ? (glyph_ast) :
    letter == ":" ? (glyph_col) :
    letter == ";" ? (glyph_scol) :
    letter == "." ? (glyph_dot) :
    letter == "/" ? (glyph_sl) :
    letter == "+" ? (glyph_add) :
    letter == "," ? (glyph_com) :
    letter == "-" ? (glyph_dif) :
    letter == "=" ? (glyph_equ) :
    letter == "?" ? (glyph_que) :
    letter == "!" ? (glyph_exc) :
    letter == "<" ? (glyph_les) :
    letter == ")" ? (glyph_pr) :
    letter == "(" ? (glyph_pl) :
    letter == "_" ? (glyph_uns) :
    letter == "'" ? (glyph_qus) :
    0; // Default value for unsupported letters

// Function that returns the path data for a subset of letters/symbols (used for solid letters)
function glyph_sorter(letter) =
    letter == "C" ? (glyph_C) :
    letter == "E" ? (glyph_E) :
    letter == "F" ? (glyph_F) :
    letter == "G" ? (glyph_G) :
    letter == "H" ? (glyph_H) :
    letter == "I" ? (glyph_I) :
    letter == "J" ? (glyph_J) :
    letter == "K" ? (glyph_K) :
    letter == "L" ? (glyph_L) :
    letter == "M" ? (glyph_M) :
    letter == "N" ? (glyph_N) :
    letter == "S" ? (glyph_S) :
    letter == "T" ? (glyph_T) :
    letter == "U" ? (glyph_U) :
    letter == "V" ? (glyph_V) :
    letter == "W" ? (glyph_W) :
    letter == "X" ? (glyph_X) :
    letter == "Y" ? (glyph_Y) :
    letter == "Z" ? (glyph_Z) :
    letter == "1" ? (glyph_1) :
    letter == "2" ? (glyph_2) :
    letter == "3" ? (glyph_3) :
    letter == "5" ? (glyph_5) :
    letter == "7" ? (glyph_7) :
    letter == "[" ? (glyph_b_l) :
    letter == "]" ? (glyph_b_r) :
    letter == "#" ? (glyph_num) :
    letter == "$" ? (glyph_dol) :
    letter == "^" ? (glyph_asc) :
    letter == "|" ? (glyph_bar) :
    letter == "*" ? (glyph_ast) :
    letter == ":" ? (glyph_col) :
    letter == ";" ? (glyph_scol) :
    letter == "." ? (glyph_dot) :
    letter == "/" ? (glyph_sl) :
    letter == "+" ? (glyph_add) :
    letter == "," ? (glyph_com) :
    letter == "-" ? (glyph_dif) :
    letter == "=" ? (glyph_equ) :
    letter == "?" ? (glyph_que) :
    letter == "!" ? (glyph_exc) :
    letter == "<" ? (glyph_les) :
    letter == ")" ? (glyph_pr) :
    letter == "(" ? (glyph_pl) :
    letter == "_" ? (glyph_uns) :
    letter == "'" ? (glyph_qus) :
    0; // Default value for unsupported letters





// Function that returns the width of a letter or symbol, used for spacing
function width_letter(letter) =
    letter == "A" ? (width_A) :
    letter == "B" ? (width_B) :
    letter == "C" ? (width_C) :
    letter == "D" ? (width_D) :
    letter == "E" ? (width_E) :
    letter == "F" ? (width_F) :
    letter == "G" ? (width_G) :
    letter == "H" ? (width_H) :
    letter == "I" ? (width_I) :
    letter == "J" ? (width_J) :
    letter == "K" ? (width_K) :
    letter == "L" ? (width_L) :
    letter == "M" ? (width_M) :
    letter == "N" ? (width_N) :
    letter == "O" ? (width_O) :
    letter == "P" ? (width_P) :
    letter == "Q" ? (width_Q) :
    letter == "R" ? (width_R) :
    letter == "S" ? (width_S) :
    letter == "T" ? (width_T) :
    letter == "U" ? (width_U) :
    letter == "V" ? (width_V) :
    letter == "W" ? (width_W) :
    letter == "X" ? (width_X) :
    letter == "Y" ? (width_Y) :
    letter == "Z" ? (width_Z) :
    letter == "0" ? (width_0) :
    letter == "1" ? (width_1) :
    letter == "2" ? (width_2) :
    letter == "3" ? (width_3) :
    letter == "4" ? (width_4) :
    letter == "5" ? (width_5) :
    letter == "6" ? (width_6) :
    letter == "7" ? (width_7) :
    letter == "8" ? (width_8) :
    letter == "9" ? (width_9) :
    letter == "@" ? (width_at) :
    letter == "[" ? (width_b_l) :
    letter == "]" ? (width_b_r) :
    letter == "%" ? (width_per) :
    letter == "#" ? (width_num) :
    letter == "$" ? (width_dol) :
    letter == "^" ? (width_asc) :
    letter == "|" ? (width_bar) :
    letter == "*" ? (width_ast) :
    letter == ":" ? (width_col) :
    letter == ";" ? (width_scol) :
    letter == "." ? (width_dot) :
    letter == "/" ? (width_sl) :
    letter == "+" ? (width_add) :
    letter == "," ? (width_com) :
    letter == "-" ? (width_dif) :
    letter == "=" ? (width_equ) :
    letter == "?" ? (width_que) :
    letter == "!" ? (width_exc) :
    letter == "<" ? (width_les) :
    letter == ")" ? (glyph_pr) :
    letter == "(" ? (glyph_pl) :
    letter == "_" ? (glyph_uns) :
    letter == "'" ? (glyph_qus) :
    0; // Default value for unsupported letters

// Module that draws a glyph with a small positive offset for tolerance
module draw_glyph(paths, height=1)
{
    linear_extrude(height) offset(wiggle)
    polygon(paths); 
}


// Module that draws the brim (outline) of a glyph with brim_radius
module draw_glyph_brim(paths, height=1)
{
    linear_extrude(height) offset(brim_radius) polygon(paths);
}


// Module that renders both words, positioning them correctly
module call_words(brim, k)
{
    // Render the second word, centered horizontally
    translate([-total_width(word2, scale_word2) / 2, 0, 0])
    {
        render_word(word2, scale_height, scale_word2, k, brim);
    }
    // Render the first word, centered horizontally and shifted vertically
    translate([-total_width(word1, scale_word1) / 2, 7.44 * scale_word2 + gap, 0])
    {
        render_word(word1, scale_height, scale_word1, k, brim);
    }
}

// Module that renders a single letter
module render_letter(letter, height, i, pre_letter, scale, k, brim)
{
    difference()
    {
        draw_glyph_brim(glyph_sorter_all(letter)*scale,brim);
        translate([0,0,bottom_thickness])
        {
            draw_glyph(glyph_sorter_all(letter)*scale, height);
            translate([-width_letter(pre_letter)*scale - spacing, 0, -1])draw_glyph_brim(glyph_sorter_all(pre_letter)*scale, height+2);
        };
    }

}


// Module that renders a word, letter by letter, with correct spacing
module render_word(word, height=1, scale, k, brim)
{
    for (i = [0 : len(word) - 1])
    {
        translate([spacing_letter(i, str(word[i]), word, scale), 0, 0])
        {
            render_letter(str(word[i]), height, i, i == 0 ? "" : str(word[i-1]), scale, k, brim);
        }
    }
}

// Function that calculates the X offset for each letter in a word
function spacing_letter(i, letter, word, scale)
= i == 0 ? 0 : spacing_letter(i-1, str(word[i-1]), word, scale) + width_letter(str(word[i-1])) * scale + spacing;

// Function that calculates the total width of a word
function total_width(word, scale) = spacing_letter(len(word)-1, str(word[len(word)-1]), word, scale) + width_letter(str(word[len(word)-1])) * scale;

// Main module: renders both words with brim only (outline)
module main() 
{
    // Only outline
    call_words(brim_height, true);
}

main();
